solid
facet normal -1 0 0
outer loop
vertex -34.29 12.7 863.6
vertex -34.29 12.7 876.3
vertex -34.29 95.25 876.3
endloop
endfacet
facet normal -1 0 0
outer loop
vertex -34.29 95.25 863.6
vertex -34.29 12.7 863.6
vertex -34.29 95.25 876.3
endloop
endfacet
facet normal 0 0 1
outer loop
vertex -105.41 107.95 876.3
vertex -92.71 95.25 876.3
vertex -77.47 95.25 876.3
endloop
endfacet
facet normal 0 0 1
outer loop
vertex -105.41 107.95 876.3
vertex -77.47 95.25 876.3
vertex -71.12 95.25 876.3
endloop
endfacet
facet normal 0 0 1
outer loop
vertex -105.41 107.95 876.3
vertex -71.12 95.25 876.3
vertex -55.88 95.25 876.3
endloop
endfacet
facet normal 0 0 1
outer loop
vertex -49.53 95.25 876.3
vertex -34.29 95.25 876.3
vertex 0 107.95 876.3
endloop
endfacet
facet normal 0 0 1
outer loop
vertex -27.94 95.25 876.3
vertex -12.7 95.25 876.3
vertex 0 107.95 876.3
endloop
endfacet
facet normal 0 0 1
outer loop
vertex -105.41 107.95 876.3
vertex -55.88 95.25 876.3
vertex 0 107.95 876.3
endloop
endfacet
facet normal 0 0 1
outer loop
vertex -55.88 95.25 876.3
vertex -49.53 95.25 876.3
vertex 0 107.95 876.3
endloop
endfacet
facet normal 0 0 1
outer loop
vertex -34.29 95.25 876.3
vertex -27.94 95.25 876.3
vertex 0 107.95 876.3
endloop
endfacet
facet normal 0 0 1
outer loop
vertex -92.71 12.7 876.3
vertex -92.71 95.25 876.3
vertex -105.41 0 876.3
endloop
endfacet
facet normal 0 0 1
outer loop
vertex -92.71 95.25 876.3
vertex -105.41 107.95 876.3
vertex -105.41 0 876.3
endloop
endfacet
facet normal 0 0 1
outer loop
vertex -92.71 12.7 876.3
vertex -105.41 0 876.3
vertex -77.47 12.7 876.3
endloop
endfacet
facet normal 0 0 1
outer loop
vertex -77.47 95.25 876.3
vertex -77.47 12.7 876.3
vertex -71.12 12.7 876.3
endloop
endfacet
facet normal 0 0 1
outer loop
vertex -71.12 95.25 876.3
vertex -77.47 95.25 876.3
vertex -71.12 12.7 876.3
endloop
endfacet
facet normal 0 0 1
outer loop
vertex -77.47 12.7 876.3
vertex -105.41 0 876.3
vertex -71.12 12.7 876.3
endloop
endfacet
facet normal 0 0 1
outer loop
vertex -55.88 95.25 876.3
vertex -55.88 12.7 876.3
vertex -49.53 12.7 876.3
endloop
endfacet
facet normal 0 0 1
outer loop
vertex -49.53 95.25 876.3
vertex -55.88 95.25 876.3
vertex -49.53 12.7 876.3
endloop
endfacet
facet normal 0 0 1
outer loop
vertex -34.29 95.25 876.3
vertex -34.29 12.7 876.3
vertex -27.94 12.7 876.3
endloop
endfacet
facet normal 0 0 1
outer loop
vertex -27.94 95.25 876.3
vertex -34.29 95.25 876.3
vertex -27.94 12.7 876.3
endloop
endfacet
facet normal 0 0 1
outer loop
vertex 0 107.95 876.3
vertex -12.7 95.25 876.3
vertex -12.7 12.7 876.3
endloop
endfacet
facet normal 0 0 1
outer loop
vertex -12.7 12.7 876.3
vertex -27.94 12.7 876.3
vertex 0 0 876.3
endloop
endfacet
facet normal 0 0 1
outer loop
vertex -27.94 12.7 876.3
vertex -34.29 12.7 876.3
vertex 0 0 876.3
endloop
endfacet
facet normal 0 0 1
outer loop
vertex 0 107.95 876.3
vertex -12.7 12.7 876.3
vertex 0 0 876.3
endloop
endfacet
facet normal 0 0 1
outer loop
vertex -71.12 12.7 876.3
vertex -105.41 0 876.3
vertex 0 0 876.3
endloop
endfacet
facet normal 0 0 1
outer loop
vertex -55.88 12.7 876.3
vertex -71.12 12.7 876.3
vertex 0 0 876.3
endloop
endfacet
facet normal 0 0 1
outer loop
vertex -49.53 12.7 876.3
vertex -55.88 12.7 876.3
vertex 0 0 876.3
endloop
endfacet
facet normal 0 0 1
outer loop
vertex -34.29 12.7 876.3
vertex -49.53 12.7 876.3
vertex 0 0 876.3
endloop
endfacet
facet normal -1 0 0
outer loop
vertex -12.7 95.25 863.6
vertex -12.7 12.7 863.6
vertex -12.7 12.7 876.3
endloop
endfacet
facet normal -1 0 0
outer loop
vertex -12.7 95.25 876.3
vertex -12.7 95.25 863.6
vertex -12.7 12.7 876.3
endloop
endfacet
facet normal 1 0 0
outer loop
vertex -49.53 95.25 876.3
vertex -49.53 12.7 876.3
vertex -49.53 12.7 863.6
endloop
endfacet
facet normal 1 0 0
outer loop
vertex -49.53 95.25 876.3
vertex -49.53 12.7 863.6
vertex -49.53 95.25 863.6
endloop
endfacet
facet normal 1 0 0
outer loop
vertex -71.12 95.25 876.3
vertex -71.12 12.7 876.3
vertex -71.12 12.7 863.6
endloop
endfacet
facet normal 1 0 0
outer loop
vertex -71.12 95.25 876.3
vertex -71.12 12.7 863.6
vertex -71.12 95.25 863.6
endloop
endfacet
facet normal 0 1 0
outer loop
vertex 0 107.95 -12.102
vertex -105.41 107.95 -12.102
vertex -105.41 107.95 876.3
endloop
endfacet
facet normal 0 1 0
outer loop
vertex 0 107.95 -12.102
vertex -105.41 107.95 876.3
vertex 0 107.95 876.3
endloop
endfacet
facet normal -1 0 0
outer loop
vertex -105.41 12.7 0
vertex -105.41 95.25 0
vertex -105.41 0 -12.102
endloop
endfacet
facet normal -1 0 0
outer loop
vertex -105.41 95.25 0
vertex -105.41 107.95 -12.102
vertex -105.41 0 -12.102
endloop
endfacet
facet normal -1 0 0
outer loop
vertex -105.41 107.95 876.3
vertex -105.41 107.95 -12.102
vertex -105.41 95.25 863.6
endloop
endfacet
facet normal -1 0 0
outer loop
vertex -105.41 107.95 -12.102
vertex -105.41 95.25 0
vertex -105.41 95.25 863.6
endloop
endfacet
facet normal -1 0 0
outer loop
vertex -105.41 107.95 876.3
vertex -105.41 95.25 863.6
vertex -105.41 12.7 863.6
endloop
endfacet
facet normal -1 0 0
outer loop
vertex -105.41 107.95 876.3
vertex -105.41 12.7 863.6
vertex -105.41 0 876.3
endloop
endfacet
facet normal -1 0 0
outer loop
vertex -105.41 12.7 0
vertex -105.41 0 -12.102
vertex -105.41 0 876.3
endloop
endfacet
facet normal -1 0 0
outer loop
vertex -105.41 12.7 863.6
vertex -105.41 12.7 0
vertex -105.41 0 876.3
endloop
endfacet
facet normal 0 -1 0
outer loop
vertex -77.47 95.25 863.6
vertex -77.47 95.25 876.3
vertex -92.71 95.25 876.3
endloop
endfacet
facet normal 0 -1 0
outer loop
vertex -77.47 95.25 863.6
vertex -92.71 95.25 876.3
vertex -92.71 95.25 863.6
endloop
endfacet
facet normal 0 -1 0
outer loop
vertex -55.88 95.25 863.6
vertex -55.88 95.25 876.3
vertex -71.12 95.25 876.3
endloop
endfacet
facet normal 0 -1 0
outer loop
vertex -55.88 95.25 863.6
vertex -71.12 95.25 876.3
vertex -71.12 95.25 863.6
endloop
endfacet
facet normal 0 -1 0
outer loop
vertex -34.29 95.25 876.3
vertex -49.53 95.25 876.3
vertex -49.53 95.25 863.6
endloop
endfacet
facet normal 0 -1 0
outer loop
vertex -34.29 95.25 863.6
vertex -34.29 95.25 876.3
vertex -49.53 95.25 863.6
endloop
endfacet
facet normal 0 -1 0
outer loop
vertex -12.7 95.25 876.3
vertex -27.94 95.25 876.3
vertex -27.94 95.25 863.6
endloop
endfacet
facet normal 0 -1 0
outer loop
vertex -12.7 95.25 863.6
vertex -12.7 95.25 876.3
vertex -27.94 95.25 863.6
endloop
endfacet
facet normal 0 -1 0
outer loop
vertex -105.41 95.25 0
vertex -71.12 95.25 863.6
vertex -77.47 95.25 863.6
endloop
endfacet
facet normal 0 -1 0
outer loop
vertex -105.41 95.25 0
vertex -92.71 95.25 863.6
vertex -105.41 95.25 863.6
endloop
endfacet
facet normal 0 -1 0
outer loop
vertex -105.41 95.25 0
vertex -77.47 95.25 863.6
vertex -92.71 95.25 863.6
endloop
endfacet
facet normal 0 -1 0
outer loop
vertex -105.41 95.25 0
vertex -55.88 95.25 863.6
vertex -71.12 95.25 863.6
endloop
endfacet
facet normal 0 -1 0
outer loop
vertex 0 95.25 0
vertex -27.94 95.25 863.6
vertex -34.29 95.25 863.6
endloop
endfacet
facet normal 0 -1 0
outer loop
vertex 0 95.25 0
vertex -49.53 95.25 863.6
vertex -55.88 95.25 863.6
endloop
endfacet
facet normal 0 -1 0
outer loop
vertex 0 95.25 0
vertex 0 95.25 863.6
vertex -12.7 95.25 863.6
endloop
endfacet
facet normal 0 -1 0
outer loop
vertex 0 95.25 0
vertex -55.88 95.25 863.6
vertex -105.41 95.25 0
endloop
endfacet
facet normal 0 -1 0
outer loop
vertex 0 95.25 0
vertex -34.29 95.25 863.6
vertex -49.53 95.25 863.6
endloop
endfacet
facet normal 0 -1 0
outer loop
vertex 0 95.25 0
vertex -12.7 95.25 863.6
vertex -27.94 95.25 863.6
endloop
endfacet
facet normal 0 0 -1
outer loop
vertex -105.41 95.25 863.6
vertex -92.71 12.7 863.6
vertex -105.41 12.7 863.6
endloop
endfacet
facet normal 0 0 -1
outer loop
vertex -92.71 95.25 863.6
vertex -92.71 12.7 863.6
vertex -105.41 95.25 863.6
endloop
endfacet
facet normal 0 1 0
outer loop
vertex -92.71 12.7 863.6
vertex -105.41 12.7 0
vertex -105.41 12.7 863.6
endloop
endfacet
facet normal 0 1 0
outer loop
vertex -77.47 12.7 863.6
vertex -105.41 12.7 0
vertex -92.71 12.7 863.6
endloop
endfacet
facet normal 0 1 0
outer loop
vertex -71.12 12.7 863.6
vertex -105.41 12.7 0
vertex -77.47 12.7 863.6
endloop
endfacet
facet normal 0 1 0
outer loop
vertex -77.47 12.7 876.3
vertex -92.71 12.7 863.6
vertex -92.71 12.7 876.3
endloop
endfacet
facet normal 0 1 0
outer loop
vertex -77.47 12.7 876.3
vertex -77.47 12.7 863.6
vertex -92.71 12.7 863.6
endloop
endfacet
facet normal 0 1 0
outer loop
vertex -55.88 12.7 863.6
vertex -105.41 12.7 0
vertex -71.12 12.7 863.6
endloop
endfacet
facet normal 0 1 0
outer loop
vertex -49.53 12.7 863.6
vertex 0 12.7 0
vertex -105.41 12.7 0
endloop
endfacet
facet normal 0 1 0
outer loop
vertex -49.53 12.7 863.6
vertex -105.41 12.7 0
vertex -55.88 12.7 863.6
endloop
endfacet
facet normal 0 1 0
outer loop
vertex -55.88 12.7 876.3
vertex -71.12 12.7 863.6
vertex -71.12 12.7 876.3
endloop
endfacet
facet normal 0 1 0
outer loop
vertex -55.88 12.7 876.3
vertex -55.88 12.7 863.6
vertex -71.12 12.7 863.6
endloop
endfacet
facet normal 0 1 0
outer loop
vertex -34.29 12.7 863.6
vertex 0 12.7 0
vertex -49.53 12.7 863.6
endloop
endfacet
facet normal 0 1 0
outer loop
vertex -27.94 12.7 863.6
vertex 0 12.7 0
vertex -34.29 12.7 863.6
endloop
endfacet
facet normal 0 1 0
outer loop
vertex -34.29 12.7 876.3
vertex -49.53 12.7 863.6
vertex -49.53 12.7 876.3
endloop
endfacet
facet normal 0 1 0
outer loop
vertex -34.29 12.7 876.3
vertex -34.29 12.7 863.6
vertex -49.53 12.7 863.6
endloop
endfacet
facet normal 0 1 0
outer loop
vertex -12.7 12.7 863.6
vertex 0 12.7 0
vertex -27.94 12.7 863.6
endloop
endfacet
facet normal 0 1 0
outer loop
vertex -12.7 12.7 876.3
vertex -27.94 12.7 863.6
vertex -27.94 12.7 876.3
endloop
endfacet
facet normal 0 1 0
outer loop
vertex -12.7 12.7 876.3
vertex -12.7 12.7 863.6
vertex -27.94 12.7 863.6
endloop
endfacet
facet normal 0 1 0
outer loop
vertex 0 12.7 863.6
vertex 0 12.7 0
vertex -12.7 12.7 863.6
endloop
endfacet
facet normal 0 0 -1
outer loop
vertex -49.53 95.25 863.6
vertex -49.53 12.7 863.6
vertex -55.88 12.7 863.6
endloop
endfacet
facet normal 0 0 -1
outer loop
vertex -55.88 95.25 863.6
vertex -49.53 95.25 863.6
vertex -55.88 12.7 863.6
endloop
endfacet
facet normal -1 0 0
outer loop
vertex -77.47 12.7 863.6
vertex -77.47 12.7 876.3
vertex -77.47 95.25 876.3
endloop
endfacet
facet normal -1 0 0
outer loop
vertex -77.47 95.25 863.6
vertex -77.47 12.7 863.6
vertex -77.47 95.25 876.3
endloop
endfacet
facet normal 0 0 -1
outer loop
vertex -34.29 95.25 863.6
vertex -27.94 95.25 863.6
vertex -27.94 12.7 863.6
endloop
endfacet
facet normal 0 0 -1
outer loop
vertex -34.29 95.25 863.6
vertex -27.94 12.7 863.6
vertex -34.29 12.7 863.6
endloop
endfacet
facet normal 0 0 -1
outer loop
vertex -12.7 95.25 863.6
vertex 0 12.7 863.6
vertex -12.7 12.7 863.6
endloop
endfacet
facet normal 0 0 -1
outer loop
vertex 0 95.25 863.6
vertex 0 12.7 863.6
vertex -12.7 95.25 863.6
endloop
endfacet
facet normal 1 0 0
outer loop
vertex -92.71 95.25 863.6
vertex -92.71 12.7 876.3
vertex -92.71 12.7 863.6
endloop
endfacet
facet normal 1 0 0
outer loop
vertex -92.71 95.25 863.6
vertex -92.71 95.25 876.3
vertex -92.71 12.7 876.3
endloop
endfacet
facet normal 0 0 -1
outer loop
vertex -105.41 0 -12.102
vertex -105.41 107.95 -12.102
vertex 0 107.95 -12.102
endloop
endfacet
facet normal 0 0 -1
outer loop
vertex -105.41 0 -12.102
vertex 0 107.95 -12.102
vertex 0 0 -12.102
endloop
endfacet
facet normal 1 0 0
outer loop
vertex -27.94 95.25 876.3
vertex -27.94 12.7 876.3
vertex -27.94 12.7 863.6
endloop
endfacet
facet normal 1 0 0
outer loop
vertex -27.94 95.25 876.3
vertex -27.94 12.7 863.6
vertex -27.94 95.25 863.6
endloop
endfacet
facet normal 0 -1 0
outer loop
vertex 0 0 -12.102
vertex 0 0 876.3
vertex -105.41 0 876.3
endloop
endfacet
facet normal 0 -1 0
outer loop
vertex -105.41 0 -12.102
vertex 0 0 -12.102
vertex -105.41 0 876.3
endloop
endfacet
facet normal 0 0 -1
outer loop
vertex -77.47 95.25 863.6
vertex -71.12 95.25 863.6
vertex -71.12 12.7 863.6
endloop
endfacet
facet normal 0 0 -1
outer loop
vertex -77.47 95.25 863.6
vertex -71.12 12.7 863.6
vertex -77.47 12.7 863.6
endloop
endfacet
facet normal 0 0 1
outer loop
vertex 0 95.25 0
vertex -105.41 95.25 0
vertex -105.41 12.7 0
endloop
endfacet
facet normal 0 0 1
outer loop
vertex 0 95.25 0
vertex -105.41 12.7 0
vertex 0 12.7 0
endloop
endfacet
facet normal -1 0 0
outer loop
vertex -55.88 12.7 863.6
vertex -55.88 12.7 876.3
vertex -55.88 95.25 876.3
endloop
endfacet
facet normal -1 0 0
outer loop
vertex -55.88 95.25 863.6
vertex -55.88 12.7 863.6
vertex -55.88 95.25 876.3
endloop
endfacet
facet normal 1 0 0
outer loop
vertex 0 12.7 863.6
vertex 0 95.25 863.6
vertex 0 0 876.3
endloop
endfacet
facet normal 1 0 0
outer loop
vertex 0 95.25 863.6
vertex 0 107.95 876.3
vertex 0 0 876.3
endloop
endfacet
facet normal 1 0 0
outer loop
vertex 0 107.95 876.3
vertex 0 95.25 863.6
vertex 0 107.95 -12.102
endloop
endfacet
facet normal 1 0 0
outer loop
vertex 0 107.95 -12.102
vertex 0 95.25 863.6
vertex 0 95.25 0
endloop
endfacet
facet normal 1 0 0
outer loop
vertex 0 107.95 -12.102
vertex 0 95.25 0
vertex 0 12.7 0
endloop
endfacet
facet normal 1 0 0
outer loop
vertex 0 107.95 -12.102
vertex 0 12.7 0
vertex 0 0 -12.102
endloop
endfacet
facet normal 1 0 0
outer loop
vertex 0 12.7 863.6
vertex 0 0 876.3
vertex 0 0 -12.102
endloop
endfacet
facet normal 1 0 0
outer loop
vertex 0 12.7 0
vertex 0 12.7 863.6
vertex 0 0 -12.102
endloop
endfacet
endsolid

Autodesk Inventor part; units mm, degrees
ref_plane "YZ Plane" through (0, 0, 0) normal (1, 0, 0) x (0, 1, 0)
ref_plane "XZ Plane" through (0, 0, 0) normal (0, 1, 0) x (-1, 0, 0)
ref_plane "XY Plane" through (0, 0, 0) normal (0, 0, 1) x (1, 0, 0)
sketch "Sketch1" plane through (0, 0, 0) normal (0, 1, 0) x (-1, 0, 0)
  line L0 (0, 0) -> (105.41, 0)
  line L1 (105.41, 0) -> (105.41, 863.6)
  line L2 (105.41, 863.6) -> (0, 863.6)
  line L3 (0, 863.6) -> (0, 0)
  dimension "d0" = 105.41
  dimension "d1" = 863.6
extrude "Extrusion1" add sketch "Sketch1" along normal blind 12.7
sketch "Sketch2" plane through (0, 12.7, 0) normal (0, 1, 0) x (1, 0, 0)
  line L0 (0, 0) -> (-105.41, 0) projected
  line L1 (0, 0) -> (-12.7, 0)
  line L2 (-12.7, 0) -> (-12.7, 12.7)
  line L3 (-12.7, 12.7) -> (0, 12.7)
  line L4 (0, 12.7) -> (0, 0)
  line L5 (-105.41, 0) -> (-105.41, -863.6) projected
  line L6 (0, 12.7) -> (-105.41, 12.7)
  line L7 (-105.41, 12.7) -> (-105.41, 0)
  line L8 (-105.41, 0) -> (0, 0)
  line L9 (0, 0) -> (0, 12.7)
  line L10 (0, -863.6) -> (0, 0) projected
  line L11 (0, -863.6) -> (-105.41, -863.6)
  line L12 (-105.41, -863.6) -> (-105.41, -876.3)
  line L13 (-105.41, -876.3) -> (0, -876.3)
  line L14 (0, -876.3) -> (0, -863.6)
  line L15 (-105.41, -863.6) -> (-92.71, -863.6)
  line L16 (-92.71, -863.6) -> (-92.71, 12.7)
  line L17 (-92.71, 12.7) -> (-105.41, 12.7)
  line L18 (-105.41, 12.7) -> (-105.41, -863.6)
  line L19 (0, 12.7) -> (-12.7, 12.7)
  line L20 (-12.7, 12.7) -> (-12.7, -876.3)
  line L21 (-12.7, -876.3) -> (0, -876.3)
  line L22 (0, -876.3) -> (0, 12.7)
  point P0 (-12.7, -863.6)
  point P1 (-92.71, 0)
  dimension "d4" = 12.7
  dimension "d5" = 12.7
  dimension "d6" = 12.7
  dimension "d7" = 12.7
  dimension "d8" = 12.7
extrude "Extrusion2" add sketch "Sketch2" along normal blind 95.25 and the other way blind 12.7 contours L10 L11 L20 L0 | L0 L2 L3 L4 | L0 L16 L6 L2 | L14 L13 L20 L11 | L16 L11 L5 L0 | L0 L7 L6 L16 | L20 L13 L12 L11
sketch "Sketch3" plane through (-105.41, 107.95, 876.3) normal (0, 0, 1) x (1, 0, 0)
  line L0 (12.7, -95.25) -> (92.71, -95.25) projected
  line L1 (12.7, -95.25) -> (12.7, 0) projected
  line L2 (92.71, -95.25) -> (92.71, 0) projected
  line L3 (92.71, -95.25) -> (77.47, -95.25)
  line L4 (77.47, -95.25) -> (77.47, -12.7)
  line L5 (77.47, -12.7) -> (92.71, -12.7)
  line L6 (92.71, -12.7) -> (92.71, -95.25)
  line L7 (12.7, -95.25) -> (27.94, -95.25)
  line L8 (27.94, -95.25) -> (27.94, -12.7)
  line L9 (27.94, -12.7) -> (12.7, -12.7)
  line L10 (12.7, -12.7) -> (12.7, -95.25)
  line L11 (27.94, -95.25) -> (34.29, -95.25)
  line L12 (34.29, -95.25) -> (34.29, -12.7)
  line L13 (34.29, -12.7) -> (27.94, -12.7)
  line L14 (27.94, -12.7) -> (27.94, -95.25)
  line L15 (77.47, -95.25) -> (71.12, -95.25)
  line L16 (71.12, -95.25) -> (71.12, -12.7)
  line L17 (71.12, -12.7) -> (77.47, -12.7)
  line L18 (77.47, -12.7) -> (77.47, -95.25)
  line L19 (34.29, -95.25) -> (49.53, -95.25)
  line L20 (49.53, -95.25) -> (49.53, -12.7)
  line L21 (49.53, -12.7) -> (34.29, -12.7)
  line L22 (34.29, -12.7) -> (34.29, -95.25)
  line L23 (71.12, -95.25) -> (55.88, -95.25)
  line L24 (55.88, -95.25) -> (55.88, -12.7)
  line L25 (55.88, -12.7) -> (71.12, -12.7)
  line L26 (71.12, -12.7) -> (71.12, -95.25)
  point P0 (105.41, -107.95)
  dimension "d13" = 15.24
  dimension "d14" = 82.55
  dimension "d15" = 15.24
  dimension "d16" = 6.35
  dimension "d17" = 6.35
  dimension "d18" = 15.24
  dimension "d19" = 15.24
extrude "Extrusion3" cut sketch "Sketch3" against normal blind 95.25 contours L1 L9 L8 L0 | L24 L25 L16 L0 | L12 L21 L20 L0 | L4 L5 L2 L0
sketch "Sketch5" plane through (-105.41, 107.95, 876.3) normal (0, 0, 1) x (1, 0, 0)
  line L0 (71.12, -95.25) -> (55.88, -95.25) projected
  line L1 (55.88, -95.25) -> (55.88, -12.7) projected
  line L2 (55.88, -12.7) -> (71.12, -12.7) projected
  line L3 (71.12, -12.7) -> (71.12, -95.25) projected
  line L4 (49.53, -95.25) -> (34.29, -95.25) projected
  line L5 (34.29, -95.25) -> (34.29, -12.7) projected
  line L6 (34.29, -12.7) -> (49.53, -12.7) projected
  line L7 (49.53, -12.7) -> (49.53, -95.25) projected
  line L8 (92.71, -95.25) -> (77.47, -95.25) projected
  line L9 (77.47, -95.25) -> (77.47, -12.7) projected
  line L10 (77.47, -12.7) -> (92.71, -12.7) projected
  line L11 (92.71, -12.7) -> (92.71, -95.25) projected
  line L12 (27.94, -95.25) -> (12.7, -95.25) projected
  line L13 (12.7, -95.25) -> (12.7, -12.7) projected
  line L14 (12.7, -12.7) -> (27.94, -12.7) projected
  line L15 (27.94, -12.7) -> (27.94, -95.25) projected
  line L16 (105.41, -107.95) -> (105.41, 0) projected
  line L17 (0, 0) -> (105.41, 0) projected
  line L18 (0, -107.95) -> (0, 0) projected
  line L19 (105.41, -107.95) -> (0, -107.95) projected
  line L20 (92.71, 0) -> (12.7, 0) projected
  circle A0 centre (52.705, 26.3525) radius 26.3525
  dimension "d40" = 52.705
extrude "Extrusion4" add sketch "Sketch5" against normal blind 1270 contours A0
sketch "Sketch6" plane through (0, 0, -12.7) normal (1, 0, 0) x (0, 0, -1)
  line L0 (0, 0) -> (-889, 0) projected
  line L1 (-444.5, 0) -> (-444.5, 160.655)
  line L2 (-889, 160.655) -> (381, 160.655) projected
  line L3 (-444.5, 160.655) -> (-444.5, 167.005)
  line L4 (-444.5, 0) -> (-444.5, -6.35)
  line L5 (-444.5, 167.005) -> (-428.625, 167.005)
  line L6 (-428.625, 167.005) -> (-460.375, 167.005)
  line L7 (-428.625, 167.005) -> (-460.375, 167.005)
  line L8 (-460.375, 167.005) -> (-460.375, -6.35)
  line L9 (-460.375, -6.35) -> (-428.625, -6.35)
  line L10 (-428.625, -6.35) -> (-428.625, 167.005)
  line L11 (-889, 0) -> (-793.75, 0)
  line L12 (0, 107.95) -> (0, 0) projected
  line L13 (0, 0) -> (-95.25, 0)
  line L14 (-95.25, 0) -> (-95.25, -6.35)
  line L15 (-793.75, 0) -> (-793.75, -6.35)
  line L16 (-793.75, -6.35) -> (-762, -6.35)
  line L17 (-762, -6.35) -> (-762, 167.005)
  line L18 (-762, 167.005) -> (-793.75, 167.005)
  line L19 (-793.75, 167.005) -> (-793.75, -6.35)
  line L20 (-95.25, -6.35) -> (-127, -6.35)
  line L21 (-127, -6.35) -> (-127, 167.005)
  line L22 (-127, 167.005) -> (-95.25, 167.005)
  line L23 (-95.25, 167.005) -> (-95.25, -6.35)
  line L24 (-111.125, 167.005) -> (-111.125, -6.35)
  line L25 (-777.875, -6.35) -> (-777.875, 167.005)
  line L26 (-777.875, 79.2503) -> (-762, 79.2503)
  line L27 (-111.125, 68.9503) -> (-95.25, 68.9503)
  line L28 (-451.8389, 167.005) -> (-451.8389, 163.0426)
  circle A0 centre (-444.5, 148.7424) radius 10.8761
  circle A1 centre (-444.5, 11.9126) radius 11.9126
  line L29 (-456.4123, 12.0028) -> (-455.3758, 148.8248)
  line L30 (-433.6242, 148.8248) -> (-432.5877, 12.0028)
  line L31 (-127, 12.7) -> (-139.7, 12.7)
  line L32 (-139.7, 12.7) -> (-165.1, 12.7)
  line L33 (-460.375, 21.426) -> (-473.075, 21.426)
  line L34 (0, 107.95) -> (-889, 107.95) projected
  line L35 (-524.7767, 107.95) -> (-524.7767, 0)
  line L36 (-524.7767, 53.975) -> (-485.775, 53.975)
  circle A2 centre (-485.775, 53.975) radius 12.7
  line L37 (-498.475, 0) -> (-498.475, -3.175)
  line L38 (-498.475, -3.175) -> (-473.075, -3.175)
  line L39 (-473.075, -3.175) -> (-473.075, 53.975)
  line L40 (-498.475, 53.975) -> (-498.475, 0)
  line L41 (-694.0635, 0) -> (-694.0635, 19.05)
  line L42 (-762, 19.05) -> (-571.5, 19.05)
  line L43 (-687.1312, 19.05) -> (-687.1312, 44.45)
  line L44 (-762, 44.45) -> (-565.15, 44.45)
  line L45 (-571.5, 19.05) -> (-565.15, 44.45)
  point P0 (-12.7, 0)
  dimension "d25" = 6.35
  dimension "d26" = 6.35
  dimension "d27" = 15.875
  dimension "d28" = 31.75
  dimension "d29" = 95.25
  dimension "d30" = 95.25
  dimension "d31" = 6.35
  dimension "d32" = 6.35
  dimension "d33" = 31.75
  dimension "d34" = 31.75
  dimension "d35" = 3.9624
  dimension "d39" = 23.8252
  dimension "d41" = 12.7
  dimension "d42" = 25.4
  dimension "d43" = 12.7
  dimension "d45" = 19.05
  dimension "d46" = 190.5
  dimension "d47" = 25.4
  dimension "d48" = 196.85
sketch "Sketch7" plane through (-105.41, 0, 876.3) normal (0, 0, 1) x (1, 0, 0)
  point P0 (105.41, 0)
extrude "Extrusion5" cut sketch "Sketch6" against normal blind 15.24 contours L42 L17 L44 L43 | L43 L44 L45 L42
sketch "Sketch8" plane through (0, 107.95, 0) normal (0, 1, 0) x (1, 0, 0)
  line L0 (0, -876.3) -> (0, 12.7) projected
  line L1 (-105.41, 12.7) -> (-105.41, -876.3) projected
  line L2 (0, 12.7) -> (-105.41, 12.7)
  line L3 (-105.41, 12.7) -> (-105.41, -876.3)
  line L4 (-105.41, -876.3) -> (0, -876.3)
  line L5 (0, -876.3) -> (0, 12.7)
  point P0 (0, 0)
extrude "Extrusion6" add sketch "Sketch8" against normal blind 12.7
sketch "Sketch9" plane through (-52.705, 134.3025, 876.3) normal (0, 0, 1) x (1, 0, 0)
  line L0 (-52.705, -26.3525) -> (0, -26.3525) projected
  line L1 (-39.5109, -26.3525) -> (301.585, -26.3525)
  line L2 (301.585, -26.3525) -> (301.585, 239.994)
  line L3 (301.585, 239.994) -> (-39.5109, 239.994)
  line L4 (-39.5109, 239.994) -> (-39.5109, -26.3525)
  point P0 (52.705, -134.3025)
extrude "Extrusion7" cut sketch "Sketch9" against normal through all
sketch "Sketch10" plane through (-105.41, 0, 876.3) normal (0, 0, 1) x (1, 0, 0)
  point P0 (105.41, 0)
sketch "Sketch11" plane through (0, 107.95, 0) normal (0, 1, 0) x (1, 0, 0)
  line L0 (-105.41, -876.3) -> (0, -876.3) projected
  line L1 (0, -876.3) -> (0, 12.7) projected
  line L2 (0, 12.7) -> (-105.41, 12.7) projected
  line L3 (-105.41, 12.7) -> (-105.41, -876.3) projected
  line L4 (-92.71, 0) -> (-12.7, 0)
  line L5 (-12.7, 0) -> (-12.7, -863.6)
  line L6 (-12.7, -863.6) -> (-92.71, -863.6)
  line L7 (-92.71, -863.6) -> (-92.71, 0)
  point P0 (0, 0)
  dimension "d55" = 12.7
extrude "Extrusion8" cut sketch "Sketch11" against normal blind 1270 contours L4 L5 L6 L7
sketch "Sketch12" plane through (0, 0, 876.3) normal (1, 0, 0) x (0, 0, -1)
  line L0 (0, 0) -> (0, 107.95) projected
  line L1 (889, 0) -> (0, 0) projected
  line L2 (889, 0) -> (889, 107.95) projected
  line L3 (0, 107.95) -> (889, 107.95) projected
  line L4 (317.5, 19.05) -> (127, 19.05) projected
  line L5 (127, 19.05) -> (127, 44.45) projected
  line L6 (127, 44.45) -> (323.85, 44.45) projected
  line L7 (323.85, 44.45) -> (317.5, 19.05) projected
  line L8 (876.3, 95.25) -> (876.3, 12.7)
  line L9 (876.3, 12.7) -> (12.7, 12.7)
  line L10 (12.7, 12.7) -> (12.7, 95.25)
  line L11 (12.7, 95.25) -> (876.3, 95.25)
  point P0 (876.3, 0)
  dimension "d58" = 12.7
extrude "Extrusion9" cut sketch "Sketch12" against normal blind 1270 contours L8 L9 L10 L11
sketch "Sketch13" plane through (-105.41, 19.05, 749.3) normal (-1, 0, 0) x (0, 0, 1)
  line L0 (-207.2337, 33.8649) -> (23.2092, 33.8649)
  line L1 (23.2092, 33.8649) -> (23.2092, -2.854)
  line L2 (23.2092, -2.854) -> (-207.2337, -2.854)
  line L3 (-207.2337, -2.854) -> (-207.2337, 33.8649)
  point P0 (-749.3, -19.05)
extrude "Extrusion10" cut sketch "Sketch13" against normal blind 1270
sketch "Sketch14" plane through (-105.41, 0, 876.3) normal (0, 0, 1) x (1, 0, 0)
  line L0 (105.41, 0) -> (0, 0) projected
  line L1 (0, 0) -> (106.6554, 0)
  line L2 (106.6554, 0) -> (106.6554, 12.7)
  line L3 (106.6554, 12.7) -> (0, 12.7)
  line L4 (0, 12.7) -> (0, 0)
  line L5 (105.41, 0) -> (105.41, 107.95) projected
  line L6 (0, 12.7) -> (0, 95.25) projected
  line L7 (105.41, 107.95) -> (0, 107.95)
  line L8 (0, 107.95) -> (0, 95.25)
  line L9 (0, 95.25) -> (105.41, 95.25)
  line L10 (105.41, 95.25) -> (105.41, 107.95)
  point P0 (105.41, 12.7)
extrude "Extrusion11" add sketch "Sketch14" against normal blind 1270 contours L0 L4 L3 L5 | L9 L8 L7 L5
sketch "Sketch15" plane through (-105.41, 0, 876.3) normal (-1, 0, 0) x (0, 0, 1)
  line L0 (-1270, 0) -> (0, 0) projected
  line L1 (-888.4017, 0) -> (-1470.844, 0)
  line L2 (-1470.844, 0) -> (-1470.844, 187.8802)
  line L3 (-1470.844, 187.8802) -> (-888.4017, 187.8802)
  line L4 (-888.4017, 187.8802) -> (-888.4017, 0)
  point P0 (-876.3, 0)
extrude "Extrusion12" cut sketch "Sketch15" against normal blind 1270
properties part number "box"
